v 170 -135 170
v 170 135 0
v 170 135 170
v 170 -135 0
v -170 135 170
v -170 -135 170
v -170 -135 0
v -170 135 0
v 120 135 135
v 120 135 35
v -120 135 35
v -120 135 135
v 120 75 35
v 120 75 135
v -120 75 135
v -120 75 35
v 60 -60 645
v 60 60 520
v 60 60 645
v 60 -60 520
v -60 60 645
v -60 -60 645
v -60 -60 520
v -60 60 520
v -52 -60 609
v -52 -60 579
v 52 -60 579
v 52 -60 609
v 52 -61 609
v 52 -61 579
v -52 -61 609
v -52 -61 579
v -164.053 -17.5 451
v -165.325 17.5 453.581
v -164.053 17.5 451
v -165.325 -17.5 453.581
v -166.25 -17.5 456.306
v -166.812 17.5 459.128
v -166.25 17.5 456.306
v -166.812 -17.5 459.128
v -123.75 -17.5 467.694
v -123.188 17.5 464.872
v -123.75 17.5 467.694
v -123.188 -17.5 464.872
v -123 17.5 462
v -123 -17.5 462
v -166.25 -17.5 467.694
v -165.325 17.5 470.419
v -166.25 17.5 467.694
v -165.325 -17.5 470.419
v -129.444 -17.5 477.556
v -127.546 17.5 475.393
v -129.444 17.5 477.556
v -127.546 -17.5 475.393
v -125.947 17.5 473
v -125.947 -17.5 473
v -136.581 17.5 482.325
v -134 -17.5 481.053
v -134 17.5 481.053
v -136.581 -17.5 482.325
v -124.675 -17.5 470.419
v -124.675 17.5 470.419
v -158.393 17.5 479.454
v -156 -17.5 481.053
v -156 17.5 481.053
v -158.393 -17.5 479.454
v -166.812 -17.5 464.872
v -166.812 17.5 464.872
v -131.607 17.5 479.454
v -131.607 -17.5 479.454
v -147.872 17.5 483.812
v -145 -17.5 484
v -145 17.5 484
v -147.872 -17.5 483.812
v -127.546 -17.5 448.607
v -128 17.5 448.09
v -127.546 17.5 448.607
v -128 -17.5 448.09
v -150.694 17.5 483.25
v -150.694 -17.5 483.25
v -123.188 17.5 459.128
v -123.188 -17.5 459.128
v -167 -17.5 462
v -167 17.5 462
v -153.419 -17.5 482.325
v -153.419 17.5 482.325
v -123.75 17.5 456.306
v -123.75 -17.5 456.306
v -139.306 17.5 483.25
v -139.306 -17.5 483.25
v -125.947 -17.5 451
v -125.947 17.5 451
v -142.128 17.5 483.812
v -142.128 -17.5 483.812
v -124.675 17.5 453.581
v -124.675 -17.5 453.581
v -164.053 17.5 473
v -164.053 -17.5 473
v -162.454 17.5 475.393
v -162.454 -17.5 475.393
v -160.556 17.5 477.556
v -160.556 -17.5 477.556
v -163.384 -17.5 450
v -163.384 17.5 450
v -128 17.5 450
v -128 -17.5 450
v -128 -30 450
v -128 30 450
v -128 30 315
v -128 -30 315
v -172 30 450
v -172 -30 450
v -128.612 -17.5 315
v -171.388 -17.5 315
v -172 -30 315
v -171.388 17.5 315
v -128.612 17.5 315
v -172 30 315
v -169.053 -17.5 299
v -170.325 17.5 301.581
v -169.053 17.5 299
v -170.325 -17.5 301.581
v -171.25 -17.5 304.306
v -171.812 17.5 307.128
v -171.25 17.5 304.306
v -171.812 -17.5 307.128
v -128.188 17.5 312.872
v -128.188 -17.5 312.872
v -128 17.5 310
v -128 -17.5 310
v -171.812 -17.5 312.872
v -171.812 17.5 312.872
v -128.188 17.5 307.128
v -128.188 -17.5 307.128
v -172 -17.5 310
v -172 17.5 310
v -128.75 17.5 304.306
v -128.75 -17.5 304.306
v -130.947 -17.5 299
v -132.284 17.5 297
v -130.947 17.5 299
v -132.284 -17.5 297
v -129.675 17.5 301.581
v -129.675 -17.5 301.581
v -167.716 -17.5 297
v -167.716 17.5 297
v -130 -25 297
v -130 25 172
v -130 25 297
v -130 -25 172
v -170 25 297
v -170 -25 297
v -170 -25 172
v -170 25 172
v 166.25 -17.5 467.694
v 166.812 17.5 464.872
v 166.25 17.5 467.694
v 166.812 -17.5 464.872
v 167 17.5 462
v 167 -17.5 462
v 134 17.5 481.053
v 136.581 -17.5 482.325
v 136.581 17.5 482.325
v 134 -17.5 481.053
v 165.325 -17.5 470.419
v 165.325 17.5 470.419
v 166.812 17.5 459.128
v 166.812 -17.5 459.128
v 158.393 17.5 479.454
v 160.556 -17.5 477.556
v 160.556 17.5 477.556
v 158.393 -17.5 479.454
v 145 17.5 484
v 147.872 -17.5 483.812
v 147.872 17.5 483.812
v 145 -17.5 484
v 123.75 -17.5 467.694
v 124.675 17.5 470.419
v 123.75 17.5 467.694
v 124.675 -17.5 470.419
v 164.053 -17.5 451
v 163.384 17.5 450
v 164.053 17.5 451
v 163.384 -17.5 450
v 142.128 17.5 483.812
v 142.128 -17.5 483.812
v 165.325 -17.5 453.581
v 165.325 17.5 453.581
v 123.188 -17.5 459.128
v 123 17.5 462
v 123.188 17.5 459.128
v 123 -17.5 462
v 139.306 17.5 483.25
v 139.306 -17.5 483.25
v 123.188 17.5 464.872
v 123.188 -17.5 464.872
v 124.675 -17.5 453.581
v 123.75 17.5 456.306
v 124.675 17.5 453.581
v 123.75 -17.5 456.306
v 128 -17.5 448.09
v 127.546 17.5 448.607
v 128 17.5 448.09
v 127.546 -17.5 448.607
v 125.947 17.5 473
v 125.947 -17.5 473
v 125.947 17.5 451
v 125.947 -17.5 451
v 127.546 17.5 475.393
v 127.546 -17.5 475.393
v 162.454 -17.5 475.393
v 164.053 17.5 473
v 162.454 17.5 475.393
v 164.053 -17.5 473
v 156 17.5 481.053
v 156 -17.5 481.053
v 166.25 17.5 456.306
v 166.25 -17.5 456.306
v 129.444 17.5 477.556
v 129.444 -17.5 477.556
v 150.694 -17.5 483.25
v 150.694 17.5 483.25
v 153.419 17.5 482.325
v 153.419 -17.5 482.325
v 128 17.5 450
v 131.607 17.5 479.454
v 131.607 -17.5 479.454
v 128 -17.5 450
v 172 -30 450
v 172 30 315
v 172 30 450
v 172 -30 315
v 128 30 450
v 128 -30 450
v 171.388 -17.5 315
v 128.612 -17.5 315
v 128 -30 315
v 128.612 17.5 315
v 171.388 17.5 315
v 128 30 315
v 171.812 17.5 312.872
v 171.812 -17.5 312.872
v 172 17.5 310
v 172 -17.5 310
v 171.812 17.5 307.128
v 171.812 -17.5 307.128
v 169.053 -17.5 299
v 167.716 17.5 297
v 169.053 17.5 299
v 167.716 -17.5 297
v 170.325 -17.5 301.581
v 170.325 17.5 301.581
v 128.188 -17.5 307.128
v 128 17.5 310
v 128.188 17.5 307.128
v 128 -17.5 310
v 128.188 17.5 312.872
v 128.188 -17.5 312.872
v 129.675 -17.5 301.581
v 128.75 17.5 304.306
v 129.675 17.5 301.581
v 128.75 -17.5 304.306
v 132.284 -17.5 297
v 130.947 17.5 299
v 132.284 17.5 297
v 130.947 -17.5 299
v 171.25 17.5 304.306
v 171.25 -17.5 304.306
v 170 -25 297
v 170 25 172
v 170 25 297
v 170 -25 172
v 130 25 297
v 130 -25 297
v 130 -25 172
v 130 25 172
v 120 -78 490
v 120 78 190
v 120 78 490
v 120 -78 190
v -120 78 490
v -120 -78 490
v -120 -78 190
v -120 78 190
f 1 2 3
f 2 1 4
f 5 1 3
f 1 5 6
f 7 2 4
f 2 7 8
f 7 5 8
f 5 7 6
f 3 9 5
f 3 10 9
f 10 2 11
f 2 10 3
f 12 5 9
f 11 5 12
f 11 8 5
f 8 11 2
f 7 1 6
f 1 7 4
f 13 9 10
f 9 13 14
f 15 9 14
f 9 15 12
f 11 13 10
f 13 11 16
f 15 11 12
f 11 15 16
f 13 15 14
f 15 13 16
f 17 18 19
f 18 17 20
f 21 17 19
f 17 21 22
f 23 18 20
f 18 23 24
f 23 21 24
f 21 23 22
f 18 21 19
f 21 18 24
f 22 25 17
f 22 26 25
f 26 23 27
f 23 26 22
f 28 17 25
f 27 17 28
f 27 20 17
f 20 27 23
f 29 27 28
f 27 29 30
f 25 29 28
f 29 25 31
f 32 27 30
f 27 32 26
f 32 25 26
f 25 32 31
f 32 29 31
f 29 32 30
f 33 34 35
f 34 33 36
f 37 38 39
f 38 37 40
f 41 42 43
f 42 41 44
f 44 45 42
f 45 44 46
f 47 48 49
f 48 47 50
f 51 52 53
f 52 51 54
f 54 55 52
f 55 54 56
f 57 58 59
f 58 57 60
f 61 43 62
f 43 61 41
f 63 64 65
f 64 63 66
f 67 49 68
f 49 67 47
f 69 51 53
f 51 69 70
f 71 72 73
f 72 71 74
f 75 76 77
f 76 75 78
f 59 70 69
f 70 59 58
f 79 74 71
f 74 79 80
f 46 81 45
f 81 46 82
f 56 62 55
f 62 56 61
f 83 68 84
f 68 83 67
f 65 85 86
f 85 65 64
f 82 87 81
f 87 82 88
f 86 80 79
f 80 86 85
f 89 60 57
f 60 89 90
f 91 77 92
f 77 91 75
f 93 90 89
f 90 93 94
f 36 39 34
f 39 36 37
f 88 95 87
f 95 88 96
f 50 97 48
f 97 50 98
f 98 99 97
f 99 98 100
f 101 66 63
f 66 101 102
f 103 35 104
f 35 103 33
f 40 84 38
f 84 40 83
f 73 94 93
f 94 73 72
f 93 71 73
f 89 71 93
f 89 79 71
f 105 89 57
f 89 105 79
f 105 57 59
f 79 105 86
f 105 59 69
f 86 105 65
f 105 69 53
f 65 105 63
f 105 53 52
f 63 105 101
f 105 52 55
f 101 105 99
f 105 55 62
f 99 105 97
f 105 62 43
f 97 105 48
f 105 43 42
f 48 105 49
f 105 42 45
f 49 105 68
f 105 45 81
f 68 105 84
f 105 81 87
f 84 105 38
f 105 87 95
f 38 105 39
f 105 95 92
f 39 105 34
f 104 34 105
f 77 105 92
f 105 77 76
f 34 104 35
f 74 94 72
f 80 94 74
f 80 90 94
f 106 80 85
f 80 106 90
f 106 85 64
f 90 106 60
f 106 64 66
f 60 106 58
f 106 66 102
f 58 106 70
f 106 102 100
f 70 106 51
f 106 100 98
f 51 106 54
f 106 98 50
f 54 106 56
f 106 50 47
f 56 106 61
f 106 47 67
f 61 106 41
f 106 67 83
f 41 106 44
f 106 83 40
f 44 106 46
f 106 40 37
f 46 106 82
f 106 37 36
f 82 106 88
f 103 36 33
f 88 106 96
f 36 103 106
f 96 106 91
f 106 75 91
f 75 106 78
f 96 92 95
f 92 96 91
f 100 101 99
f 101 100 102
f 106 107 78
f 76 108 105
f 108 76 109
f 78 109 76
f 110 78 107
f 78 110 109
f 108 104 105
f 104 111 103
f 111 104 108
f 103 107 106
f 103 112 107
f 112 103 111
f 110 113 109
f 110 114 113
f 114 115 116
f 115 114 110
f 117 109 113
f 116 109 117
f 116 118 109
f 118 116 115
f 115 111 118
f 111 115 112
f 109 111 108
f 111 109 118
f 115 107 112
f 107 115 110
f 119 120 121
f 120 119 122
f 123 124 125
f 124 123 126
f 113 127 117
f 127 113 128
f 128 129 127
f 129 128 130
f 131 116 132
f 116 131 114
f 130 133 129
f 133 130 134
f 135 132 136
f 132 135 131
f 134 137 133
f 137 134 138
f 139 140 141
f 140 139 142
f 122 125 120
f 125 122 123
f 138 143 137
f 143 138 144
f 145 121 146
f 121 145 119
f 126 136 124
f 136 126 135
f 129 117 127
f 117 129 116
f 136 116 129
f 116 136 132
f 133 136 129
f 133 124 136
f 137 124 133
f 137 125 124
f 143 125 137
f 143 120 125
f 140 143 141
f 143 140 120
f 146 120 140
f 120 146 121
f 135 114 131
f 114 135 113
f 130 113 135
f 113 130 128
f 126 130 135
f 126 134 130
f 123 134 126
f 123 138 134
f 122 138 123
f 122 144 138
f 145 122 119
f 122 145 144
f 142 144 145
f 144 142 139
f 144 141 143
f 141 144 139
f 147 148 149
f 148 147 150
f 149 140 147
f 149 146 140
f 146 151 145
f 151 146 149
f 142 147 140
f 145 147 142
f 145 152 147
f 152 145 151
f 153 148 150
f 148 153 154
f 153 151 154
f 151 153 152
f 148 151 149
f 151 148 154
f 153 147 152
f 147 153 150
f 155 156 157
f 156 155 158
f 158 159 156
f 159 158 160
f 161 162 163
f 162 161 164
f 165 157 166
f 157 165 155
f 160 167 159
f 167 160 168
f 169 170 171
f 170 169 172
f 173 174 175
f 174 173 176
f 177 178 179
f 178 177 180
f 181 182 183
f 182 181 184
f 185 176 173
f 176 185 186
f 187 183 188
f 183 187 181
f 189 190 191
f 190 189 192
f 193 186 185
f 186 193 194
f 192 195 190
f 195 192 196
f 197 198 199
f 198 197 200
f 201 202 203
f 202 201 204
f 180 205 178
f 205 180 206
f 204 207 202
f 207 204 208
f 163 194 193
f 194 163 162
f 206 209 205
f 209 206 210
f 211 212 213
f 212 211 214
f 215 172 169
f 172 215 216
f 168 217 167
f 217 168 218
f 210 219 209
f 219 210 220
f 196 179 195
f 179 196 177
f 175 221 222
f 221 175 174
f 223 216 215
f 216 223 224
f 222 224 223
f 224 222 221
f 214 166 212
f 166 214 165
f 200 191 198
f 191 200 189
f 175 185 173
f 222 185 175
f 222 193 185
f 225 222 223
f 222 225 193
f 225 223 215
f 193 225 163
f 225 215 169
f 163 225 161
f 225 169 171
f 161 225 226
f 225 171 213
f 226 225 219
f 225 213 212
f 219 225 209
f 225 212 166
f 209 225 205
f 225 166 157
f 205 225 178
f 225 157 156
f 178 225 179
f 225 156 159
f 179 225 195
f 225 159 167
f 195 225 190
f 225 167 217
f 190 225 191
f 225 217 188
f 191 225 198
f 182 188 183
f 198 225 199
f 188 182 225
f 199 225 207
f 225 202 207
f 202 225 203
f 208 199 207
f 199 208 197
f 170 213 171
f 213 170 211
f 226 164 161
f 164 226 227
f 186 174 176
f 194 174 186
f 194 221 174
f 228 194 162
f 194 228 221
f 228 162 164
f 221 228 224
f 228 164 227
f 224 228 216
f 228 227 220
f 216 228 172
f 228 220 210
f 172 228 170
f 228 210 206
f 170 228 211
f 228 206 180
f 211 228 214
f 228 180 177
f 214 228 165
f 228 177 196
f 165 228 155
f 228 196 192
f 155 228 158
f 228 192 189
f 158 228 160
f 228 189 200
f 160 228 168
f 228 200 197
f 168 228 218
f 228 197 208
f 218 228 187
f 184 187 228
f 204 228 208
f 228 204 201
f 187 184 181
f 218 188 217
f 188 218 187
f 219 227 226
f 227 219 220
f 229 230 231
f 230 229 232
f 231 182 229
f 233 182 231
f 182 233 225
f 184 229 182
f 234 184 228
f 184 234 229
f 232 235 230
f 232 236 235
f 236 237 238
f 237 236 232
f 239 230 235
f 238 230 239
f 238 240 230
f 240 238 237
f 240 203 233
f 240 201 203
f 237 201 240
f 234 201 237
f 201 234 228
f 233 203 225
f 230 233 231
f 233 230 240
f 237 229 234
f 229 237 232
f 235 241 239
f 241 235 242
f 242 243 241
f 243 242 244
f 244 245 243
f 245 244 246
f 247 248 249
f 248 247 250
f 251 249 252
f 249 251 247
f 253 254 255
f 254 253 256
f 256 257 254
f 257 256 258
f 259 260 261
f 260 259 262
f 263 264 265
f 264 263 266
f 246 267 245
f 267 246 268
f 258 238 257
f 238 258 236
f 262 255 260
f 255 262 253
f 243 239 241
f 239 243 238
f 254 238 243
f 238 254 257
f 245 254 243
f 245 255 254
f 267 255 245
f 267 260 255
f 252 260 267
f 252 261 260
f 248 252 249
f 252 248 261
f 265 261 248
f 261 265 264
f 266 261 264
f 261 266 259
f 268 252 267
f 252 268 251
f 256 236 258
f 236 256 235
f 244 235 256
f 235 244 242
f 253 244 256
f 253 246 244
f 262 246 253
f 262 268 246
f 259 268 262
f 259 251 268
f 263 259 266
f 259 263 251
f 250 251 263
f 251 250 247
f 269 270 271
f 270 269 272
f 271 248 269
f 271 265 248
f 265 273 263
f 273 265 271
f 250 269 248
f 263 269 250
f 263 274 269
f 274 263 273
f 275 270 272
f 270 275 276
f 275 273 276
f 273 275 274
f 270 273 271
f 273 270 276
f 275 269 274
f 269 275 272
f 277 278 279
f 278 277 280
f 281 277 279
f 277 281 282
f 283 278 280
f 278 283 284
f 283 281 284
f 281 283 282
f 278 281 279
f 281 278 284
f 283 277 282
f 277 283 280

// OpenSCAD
// KOKORO AC-FIRST / v1.0. Units: millimeters.
// Engineering envelope only. The 8 actuator CYLINDERS are volume placeholders,
// NOT selected motor hardware, and the Ca battery is not manufactured.
// Fixed-base upper-body robot: overall height 650mm. Includes no mobile legs.
$fn=48;
show_electronics=true;
show_bay=true;
base_w=340;base_d=270;base_h=170;
internal_bay_w=240;internal_bay_d=150;internal_bay_h=100;

module base(){
 color([.20,.23,.29]) difference(){
   translate([-base_w/2,-base_d/2,0]) cube([base_w,base_d,base_h]);
   // Real empty battery volume, not a second decorative cube inside solid plastic.
   translate([-internal_bay_w/2,-internal_bay_d/2,35]) cube([internal_bay_w,internal_bay_d,internal_bay_h]);
   // Removable-service access to rear, requiring later door/fastener design.
   translate([-internal_bay_w/2, internal_bay_d/2-0.1,35])
        cube([internal_bay_w, base_d/2-internal_bay_d/2+0.2,internal_bay_h]);
 }
 if(show_bay) color([.15,.75,.90,.65]) translate([-internal_bay_w/2,-internal_bay_d/2,35]) cube([internal_bay_w,internal_bay_d,internal_bay_h]);
 if(show_electronics) color([.18,.63,.40]) translate([-110,-100,138]) cube([220,40,4]); // reserved power electronics board strip, not a PCB
}
module torso(){color([.56,.62,.72]) translate([-120,-78,190]) cube([240,156,300]);}
module head(){
 color([.75,.78,.82]) translate([-60,-60,520]) cube([120,120,125]);
 color([.06,.08,.09]) translate([-52,-61,579]) cube([104,2,30]);
}
module shaft(x,y,z){color([.1,.42,.62]) translate([x,y,z]) rotate([90,0,0]) cylinder(d=44,h=35,center=true);}
module arm(s){
 // s +/-1: shoulder centers near x +/-145 at z 462; elbow z 315
 shaft(s*145,0,462);  // one motor-envelope of two per shoulder; nested axes require rework
 color([.70,.73,.78]) translate([s*150-22,-30,315]) cube([44,60,135]);
 shaft(s*150,0,310);
 color([.73,.75,.81]) translate([s*150-20,-25,172]) cube([40,50,125]);
}
base();torso();head();arm(-1);arm(1);
// 8 DOF target: 2 head + 2 per shoulder + 1 elbow per side = 8.
// Placeholders only and not interference-resolved. Actual mechanics require selected encoders,
// gearboxes, bearings, mounts, torque constraints, cable runs, thermal budgets and fabrication tolerances.
